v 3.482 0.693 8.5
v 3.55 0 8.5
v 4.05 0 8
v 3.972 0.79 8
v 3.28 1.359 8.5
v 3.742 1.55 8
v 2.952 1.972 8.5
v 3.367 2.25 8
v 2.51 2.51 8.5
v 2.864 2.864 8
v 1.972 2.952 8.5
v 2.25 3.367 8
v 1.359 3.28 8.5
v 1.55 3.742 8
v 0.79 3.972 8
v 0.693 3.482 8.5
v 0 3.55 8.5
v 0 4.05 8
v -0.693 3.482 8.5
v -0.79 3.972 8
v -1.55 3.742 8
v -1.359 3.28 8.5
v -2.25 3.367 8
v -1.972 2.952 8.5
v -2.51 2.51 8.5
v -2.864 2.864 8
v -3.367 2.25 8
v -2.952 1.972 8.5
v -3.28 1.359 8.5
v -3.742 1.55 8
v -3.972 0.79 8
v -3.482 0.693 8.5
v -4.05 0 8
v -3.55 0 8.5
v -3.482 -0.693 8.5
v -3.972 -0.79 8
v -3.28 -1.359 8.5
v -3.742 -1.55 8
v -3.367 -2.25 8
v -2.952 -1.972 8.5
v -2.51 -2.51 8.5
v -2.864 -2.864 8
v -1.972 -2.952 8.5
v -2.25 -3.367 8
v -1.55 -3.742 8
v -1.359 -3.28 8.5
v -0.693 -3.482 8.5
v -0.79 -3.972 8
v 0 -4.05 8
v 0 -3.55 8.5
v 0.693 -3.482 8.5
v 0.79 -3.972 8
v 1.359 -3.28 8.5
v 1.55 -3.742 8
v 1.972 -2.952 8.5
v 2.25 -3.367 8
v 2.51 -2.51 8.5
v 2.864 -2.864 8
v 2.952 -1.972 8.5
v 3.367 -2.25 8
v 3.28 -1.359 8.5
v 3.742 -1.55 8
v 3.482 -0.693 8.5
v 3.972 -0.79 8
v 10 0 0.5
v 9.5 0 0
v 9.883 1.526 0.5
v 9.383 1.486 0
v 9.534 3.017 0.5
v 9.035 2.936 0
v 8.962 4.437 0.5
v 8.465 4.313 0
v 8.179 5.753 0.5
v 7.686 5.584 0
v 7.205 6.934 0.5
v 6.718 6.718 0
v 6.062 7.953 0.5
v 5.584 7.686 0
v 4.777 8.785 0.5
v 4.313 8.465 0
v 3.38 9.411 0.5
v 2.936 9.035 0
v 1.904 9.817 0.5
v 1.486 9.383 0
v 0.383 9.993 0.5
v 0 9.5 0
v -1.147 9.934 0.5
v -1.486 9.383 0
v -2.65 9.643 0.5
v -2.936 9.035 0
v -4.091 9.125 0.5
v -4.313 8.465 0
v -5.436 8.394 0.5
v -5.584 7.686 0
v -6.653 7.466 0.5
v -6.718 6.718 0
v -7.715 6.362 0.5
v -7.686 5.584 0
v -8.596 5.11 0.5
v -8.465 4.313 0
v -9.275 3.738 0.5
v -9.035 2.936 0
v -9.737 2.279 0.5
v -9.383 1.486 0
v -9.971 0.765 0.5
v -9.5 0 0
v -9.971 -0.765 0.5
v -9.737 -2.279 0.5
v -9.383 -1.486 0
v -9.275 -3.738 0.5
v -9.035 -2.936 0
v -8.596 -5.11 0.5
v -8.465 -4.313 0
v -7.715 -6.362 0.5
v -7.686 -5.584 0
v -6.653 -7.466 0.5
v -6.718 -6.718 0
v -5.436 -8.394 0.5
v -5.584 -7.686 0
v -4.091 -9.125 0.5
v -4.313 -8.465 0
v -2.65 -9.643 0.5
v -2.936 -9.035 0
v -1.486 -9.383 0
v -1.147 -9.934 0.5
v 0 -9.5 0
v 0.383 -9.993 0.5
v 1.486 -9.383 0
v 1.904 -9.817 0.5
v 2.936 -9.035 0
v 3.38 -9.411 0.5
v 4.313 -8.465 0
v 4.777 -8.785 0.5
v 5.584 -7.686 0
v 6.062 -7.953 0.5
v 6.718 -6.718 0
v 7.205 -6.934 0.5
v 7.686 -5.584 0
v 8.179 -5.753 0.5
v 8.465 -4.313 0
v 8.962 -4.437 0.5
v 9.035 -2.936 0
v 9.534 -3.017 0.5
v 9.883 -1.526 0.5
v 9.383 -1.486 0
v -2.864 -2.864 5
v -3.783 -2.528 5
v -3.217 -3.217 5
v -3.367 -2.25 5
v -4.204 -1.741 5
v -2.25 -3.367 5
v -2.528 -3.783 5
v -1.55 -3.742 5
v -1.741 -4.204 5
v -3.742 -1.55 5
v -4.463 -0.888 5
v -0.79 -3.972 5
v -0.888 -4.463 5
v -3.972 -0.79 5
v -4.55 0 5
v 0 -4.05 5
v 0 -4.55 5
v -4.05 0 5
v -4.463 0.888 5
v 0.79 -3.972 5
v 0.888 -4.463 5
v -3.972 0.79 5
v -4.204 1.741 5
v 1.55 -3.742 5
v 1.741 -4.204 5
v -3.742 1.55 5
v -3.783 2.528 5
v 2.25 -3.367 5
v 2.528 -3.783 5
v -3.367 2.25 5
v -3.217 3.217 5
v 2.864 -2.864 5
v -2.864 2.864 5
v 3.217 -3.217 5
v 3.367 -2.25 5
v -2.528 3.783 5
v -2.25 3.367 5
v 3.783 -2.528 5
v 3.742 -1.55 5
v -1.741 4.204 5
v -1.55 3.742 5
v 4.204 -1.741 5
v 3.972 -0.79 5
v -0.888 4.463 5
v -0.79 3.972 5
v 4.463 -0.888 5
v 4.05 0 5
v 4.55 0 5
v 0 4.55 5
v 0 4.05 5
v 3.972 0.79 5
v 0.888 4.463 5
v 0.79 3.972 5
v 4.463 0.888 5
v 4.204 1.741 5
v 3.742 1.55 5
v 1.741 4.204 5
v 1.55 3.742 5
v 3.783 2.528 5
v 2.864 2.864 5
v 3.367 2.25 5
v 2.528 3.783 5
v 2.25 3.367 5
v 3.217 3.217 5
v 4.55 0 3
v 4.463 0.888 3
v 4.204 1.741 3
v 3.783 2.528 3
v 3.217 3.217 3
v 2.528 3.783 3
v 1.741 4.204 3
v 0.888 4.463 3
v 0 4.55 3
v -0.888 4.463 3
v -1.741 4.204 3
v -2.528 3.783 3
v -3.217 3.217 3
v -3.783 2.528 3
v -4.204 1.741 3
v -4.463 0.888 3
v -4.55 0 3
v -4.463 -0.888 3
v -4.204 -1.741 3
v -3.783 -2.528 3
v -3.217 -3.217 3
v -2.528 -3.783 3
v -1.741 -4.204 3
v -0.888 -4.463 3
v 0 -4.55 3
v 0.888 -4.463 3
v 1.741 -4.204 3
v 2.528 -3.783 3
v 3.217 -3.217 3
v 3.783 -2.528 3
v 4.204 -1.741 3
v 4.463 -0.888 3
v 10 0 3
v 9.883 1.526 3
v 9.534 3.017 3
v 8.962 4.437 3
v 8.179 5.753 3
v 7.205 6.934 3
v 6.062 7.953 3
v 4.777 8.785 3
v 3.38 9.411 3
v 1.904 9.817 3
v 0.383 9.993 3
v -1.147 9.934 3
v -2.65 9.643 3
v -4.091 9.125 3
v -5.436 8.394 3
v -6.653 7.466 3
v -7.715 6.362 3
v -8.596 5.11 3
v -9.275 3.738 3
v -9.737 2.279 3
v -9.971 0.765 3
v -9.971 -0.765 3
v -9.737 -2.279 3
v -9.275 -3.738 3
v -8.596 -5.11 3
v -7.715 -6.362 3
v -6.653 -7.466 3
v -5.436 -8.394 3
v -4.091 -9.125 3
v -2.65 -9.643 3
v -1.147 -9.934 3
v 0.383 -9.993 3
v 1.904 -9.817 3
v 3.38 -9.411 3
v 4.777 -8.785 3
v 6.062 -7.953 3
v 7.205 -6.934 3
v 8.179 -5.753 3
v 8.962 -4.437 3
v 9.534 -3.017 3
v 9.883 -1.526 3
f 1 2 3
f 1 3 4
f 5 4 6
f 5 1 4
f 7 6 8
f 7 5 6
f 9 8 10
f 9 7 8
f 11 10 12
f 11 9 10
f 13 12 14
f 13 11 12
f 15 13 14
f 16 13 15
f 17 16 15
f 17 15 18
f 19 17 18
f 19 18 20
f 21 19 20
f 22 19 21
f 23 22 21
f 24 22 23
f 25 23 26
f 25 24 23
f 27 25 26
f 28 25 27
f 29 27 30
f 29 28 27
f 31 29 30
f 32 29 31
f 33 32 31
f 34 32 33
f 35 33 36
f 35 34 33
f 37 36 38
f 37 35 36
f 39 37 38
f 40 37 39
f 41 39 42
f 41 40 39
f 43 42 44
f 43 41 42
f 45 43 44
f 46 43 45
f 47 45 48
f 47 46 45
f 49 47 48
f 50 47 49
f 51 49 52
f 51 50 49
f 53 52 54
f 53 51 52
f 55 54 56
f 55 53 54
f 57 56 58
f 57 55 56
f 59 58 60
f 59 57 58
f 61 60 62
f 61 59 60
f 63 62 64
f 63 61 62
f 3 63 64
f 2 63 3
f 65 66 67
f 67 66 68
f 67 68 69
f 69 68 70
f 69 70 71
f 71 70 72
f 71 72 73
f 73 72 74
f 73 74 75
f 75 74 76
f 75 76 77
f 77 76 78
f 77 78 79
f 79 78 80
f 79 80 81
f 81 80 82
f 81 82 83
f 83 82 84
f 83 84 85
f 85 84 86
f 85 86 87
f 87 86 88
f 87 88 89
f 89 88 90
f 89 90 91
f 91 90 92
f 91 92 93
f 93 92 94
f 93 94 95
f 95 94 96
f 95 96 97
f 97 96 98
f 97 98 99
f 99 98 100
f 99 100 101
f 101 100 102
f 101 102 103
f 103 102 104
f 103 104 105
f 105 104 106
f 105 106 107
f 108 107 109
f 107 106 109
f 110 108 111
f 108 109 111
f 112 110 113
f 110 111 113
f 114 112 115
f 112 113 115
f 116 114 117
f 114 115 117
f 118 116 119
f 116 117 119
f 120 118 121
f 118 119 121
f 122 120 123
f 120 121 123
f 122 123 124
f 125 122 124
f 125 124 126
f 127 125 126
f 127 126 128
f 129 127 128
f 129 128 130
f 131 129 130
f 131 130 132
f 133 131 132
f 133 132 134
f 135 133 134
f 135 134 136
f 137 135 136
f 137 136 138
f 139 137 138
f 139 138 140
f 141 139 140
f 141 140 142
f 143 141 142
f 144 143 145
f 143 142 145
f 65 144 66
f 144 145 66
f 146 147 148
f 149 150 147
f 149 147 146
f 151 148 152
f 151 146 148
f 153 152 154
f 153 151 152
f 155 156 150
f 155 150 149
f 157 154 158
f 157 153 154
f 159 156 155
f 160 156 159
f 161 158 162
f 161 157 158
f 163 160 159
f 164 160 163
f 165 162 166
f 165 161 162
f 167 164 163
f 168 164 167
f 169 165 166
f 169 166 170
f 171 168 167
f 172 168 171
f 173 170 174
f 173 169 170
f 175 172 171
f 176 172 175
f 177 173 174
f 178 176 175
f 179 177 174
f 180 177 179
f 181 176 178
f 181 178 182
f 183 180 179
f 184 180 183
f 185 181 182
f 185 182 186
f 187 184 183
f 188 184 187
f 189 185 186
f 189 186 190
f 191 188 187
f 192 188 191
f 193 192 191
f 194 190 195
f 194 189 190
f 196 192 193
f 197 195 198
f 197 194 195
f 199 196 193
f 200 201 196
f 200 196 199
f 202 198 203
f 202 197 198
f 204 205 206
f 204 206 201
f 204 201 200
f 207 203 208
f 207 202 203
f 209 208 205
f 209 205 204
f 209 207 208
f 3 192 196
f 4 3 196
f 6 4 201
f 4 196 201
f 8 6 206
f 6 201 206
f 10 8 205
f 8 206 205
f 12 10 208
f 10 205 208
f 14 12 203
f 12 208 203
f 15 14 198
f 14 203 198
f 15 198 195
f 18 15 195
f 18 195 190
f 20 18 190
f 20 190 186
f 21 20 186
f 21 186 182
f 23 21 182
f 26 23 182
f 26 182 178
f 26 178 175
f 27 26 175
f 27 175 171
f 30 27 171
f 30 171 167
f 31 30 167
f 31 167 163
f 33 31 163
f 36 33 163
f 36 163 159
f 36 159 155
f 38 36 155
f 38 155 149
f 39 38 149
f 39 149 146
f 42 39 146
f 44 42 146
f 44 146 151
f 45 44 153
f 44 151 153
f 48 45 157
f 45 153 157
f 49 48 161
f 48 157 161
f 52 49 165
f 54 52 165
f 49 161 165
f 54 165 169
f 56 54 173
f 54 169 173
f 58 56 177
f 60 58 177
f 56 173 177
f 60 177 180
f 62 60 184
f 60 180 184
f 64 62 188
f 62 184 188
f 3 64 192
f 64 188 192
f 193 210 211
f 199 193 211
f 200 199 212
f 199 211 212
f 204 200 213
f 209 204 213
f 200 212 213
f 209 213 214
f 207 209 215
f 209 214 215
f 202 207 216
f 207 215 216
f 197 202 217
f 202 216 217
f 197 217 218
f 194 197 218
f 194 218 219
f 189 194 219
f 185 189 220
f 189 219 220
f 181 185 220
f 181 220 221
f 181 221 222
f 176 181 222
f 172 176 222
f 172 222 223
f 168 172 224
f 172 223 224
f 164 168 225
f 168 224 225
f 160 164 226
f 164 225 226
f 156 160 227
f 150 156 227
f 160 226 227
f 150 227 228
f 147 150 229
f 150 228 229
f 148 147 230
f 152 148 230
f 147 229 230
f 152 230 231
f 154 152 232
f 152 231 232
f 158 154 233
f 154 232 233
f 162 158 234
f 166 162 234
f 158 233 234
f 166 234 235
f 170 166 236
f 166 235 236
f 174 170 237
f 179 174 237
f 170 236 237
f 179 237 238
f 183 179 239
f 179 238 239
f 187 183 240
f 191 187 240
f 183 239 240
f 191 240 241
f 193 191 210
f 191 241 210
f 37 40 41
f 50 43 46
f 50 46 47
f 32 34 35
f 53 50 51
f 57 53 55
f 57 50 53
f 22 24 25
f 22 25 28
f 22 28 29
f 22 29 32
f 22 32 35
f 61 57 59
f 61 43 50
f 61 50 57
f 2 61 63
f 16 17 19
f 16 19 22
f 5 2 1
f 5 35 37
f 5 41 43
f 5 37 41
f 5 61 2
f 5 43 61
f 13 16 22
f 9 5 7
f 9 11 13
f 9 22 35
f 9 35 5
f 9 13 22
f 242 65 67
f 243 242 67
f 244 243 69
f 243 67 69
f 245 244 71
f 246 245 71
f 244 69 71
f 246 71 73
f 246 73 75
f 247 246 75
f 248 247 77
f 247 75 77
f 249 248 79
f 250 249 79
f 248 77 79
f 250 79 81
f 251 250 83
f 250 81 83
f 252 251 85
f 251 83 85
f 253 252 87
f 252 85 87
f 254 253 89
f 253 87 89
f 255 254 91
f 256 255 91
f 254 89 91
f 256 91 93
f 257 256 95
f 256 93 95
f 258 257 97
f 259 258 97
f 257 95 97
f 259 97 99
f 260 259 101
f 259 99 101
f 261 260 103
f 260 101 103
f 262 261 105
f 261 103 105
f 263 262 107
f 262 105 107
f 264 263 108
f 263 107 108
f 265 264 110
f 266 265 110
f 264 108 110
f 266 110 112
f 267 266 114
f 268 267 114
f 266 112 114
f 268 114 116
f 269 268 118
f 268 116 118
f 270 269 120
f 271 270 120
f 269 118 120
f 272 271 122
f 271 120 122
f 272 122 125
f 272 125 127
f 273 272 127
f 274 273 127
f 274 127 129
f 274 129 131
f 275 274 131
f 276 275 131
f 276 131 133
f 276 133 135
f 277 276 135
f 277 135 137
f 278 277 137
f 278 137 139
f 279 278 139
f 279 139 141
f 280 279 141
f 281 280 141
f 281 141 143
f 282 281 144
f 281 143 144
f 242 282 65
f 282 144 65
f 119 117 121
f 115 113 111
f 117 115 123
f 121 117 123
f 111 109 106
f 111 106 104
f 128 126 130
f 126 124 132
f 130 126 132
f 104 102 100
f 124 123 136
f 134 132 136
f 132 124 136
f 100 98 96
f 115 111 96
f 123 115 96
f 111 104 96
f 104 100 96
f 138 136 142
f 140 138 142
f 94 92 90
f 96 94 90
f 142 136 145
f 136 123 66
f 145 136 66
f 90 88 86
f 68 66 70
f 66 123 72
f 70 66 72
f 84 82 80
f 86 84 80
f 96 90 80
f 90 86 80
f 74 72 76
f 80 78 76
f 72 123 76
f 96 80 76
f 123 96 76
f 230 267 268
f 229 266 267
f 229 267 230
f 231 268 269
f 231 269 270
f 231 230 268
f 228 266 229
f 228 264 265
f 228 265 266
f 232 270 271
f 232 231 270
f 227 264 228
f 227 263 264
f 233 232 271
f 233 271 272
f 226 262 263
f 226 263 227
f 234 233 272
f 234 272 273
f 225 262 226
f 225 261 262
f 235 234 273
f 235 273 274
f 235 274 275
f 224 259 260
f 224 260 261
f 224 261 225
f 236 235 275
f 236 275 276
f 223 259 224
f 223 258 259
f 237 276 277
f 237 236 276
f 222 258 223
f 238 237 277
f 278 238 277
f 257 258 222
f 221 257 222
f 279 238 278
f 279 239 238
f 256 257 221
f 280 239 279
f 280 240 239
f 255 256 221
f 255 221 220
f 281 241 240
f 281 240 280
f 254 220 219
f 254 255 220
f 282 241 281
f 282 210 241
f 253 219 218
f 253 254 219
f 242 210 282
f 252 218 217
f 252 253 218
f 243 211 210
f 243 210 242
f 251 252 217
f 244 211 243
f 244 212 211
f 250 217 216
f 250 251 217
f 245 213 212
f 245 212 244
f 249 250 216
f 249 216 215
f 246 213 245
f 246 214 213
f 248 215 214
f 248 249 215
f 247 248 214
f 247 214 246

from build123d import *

# Parameters (mm, degrees)
F0_R     = 10
F1_DEPTH = 3
F2_R     = 4.05
F3_DEPTH = 5.5
F4_SIZE  = 0.5
F5_R     = 4.55
F6_DEPTH = 2


with BuildPart() as f1:
    # F0 (on Top) → F1 (new body)
    with BuildSketch(Plane.XY):
        Circle(F0_R)
    extrude(amount=F1_DEPTH)

    # F2 (on face) → F3 (join)
    with BuildSketch(Plane.XY.offset(3)):
        Circle(F2_R)
    extrude(amount=F3_DEPTH)

    # F4
    f4_edges = [f1.edges().sort_by_distance(p)[0] for p in [
        (-4.05, 0, 8.5),
        (-10, 0, 0),
    ]]
    chamfer(f4_edges, length=F4_SIZE)

    # F5 (on face) → F6 (join)
    with BuildSketch(Plane.XY.offset(3)):
        Circle(F5_R)
    extrude(amount=F6_DEPTH)


solid = f1.part
